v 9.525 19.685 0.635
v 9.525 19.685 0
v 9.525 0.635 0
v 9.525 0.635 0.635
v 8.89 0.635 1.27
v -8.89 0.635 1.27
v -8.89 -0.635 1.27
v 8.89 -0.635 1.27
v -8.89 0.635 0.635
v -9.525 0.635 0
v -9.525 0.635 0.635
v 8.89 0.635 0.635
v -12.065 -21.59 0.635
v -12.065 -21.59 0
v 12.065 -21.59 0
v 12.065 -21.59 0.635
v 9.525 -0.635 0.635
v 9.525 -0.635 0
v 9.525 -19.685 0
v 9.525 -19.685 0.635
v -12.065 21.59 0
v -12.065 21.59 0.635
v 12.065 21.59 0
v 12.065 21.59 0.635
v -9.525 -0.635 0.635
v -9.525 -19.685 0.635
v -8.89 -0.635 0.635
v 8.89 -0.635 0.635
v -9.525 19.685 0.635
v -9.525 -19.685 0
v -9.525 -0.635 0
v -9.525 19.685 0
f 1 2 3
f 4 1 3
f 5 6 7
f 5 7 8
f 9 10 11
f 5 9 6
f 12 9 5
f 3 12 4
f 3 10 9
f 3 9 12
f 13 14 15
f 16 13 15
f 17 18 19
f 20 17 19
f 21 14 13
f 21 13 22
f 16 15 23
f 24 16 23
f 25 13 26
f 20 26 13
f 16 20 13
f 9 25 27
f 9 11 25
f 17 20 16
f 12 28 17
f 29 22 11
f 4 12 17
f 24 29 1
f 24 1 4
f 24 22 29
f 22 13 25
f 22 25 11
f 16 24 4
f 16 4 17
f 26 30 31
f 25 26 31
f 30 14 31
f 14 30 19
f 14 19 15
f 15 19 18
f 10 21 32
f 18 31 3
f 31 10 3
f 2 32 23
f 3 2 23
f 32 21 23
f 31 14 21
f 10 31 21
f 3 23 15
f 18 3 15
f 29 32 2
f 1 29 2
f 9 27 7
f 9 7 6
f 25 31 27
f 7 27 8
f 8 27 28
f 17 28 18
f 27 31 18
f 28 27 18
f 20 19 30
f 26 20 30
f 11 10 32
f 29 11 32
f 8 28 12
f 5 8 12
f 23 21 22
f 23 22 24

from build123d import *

# Parameters (mm, degrees)
F0_W     = 24.13
F0_H     = 43.18
F1_DEPTH = 0.635
F0_W_2   = 17.78
F0_H_2   = 1.27
F2_DEPTH = 1.27


with BuildPart() as f1:
    # F0 (on Top) → F1 (new body)
    with BuildSketch(Plane.XY):
        Rectangle(F0_W, F0_H)
        Polygon((8.89, -0.635), (9.525, -0.635), (9.525, -19.685), (-9.525, -19.685), (-9.525, -0.635), (-8.89, -0.635), (-8.89, 0.635), (-9.525, 0.635), (-9.525, 19.685), (9.525, 19.685), (9.525, 0.635), (8.89, 0.635), align=None, mode=Mode.SUBTRACT)
    extrude(amount=F1_DEPTH)

    # F0 (on Top) → F2 (join)
    with BuildSketch(Plane.XY):
        Rectangle(F0_W_2, F0_H_2)
    extrude(amount=F2_DEPTH)


solid = f1.part
